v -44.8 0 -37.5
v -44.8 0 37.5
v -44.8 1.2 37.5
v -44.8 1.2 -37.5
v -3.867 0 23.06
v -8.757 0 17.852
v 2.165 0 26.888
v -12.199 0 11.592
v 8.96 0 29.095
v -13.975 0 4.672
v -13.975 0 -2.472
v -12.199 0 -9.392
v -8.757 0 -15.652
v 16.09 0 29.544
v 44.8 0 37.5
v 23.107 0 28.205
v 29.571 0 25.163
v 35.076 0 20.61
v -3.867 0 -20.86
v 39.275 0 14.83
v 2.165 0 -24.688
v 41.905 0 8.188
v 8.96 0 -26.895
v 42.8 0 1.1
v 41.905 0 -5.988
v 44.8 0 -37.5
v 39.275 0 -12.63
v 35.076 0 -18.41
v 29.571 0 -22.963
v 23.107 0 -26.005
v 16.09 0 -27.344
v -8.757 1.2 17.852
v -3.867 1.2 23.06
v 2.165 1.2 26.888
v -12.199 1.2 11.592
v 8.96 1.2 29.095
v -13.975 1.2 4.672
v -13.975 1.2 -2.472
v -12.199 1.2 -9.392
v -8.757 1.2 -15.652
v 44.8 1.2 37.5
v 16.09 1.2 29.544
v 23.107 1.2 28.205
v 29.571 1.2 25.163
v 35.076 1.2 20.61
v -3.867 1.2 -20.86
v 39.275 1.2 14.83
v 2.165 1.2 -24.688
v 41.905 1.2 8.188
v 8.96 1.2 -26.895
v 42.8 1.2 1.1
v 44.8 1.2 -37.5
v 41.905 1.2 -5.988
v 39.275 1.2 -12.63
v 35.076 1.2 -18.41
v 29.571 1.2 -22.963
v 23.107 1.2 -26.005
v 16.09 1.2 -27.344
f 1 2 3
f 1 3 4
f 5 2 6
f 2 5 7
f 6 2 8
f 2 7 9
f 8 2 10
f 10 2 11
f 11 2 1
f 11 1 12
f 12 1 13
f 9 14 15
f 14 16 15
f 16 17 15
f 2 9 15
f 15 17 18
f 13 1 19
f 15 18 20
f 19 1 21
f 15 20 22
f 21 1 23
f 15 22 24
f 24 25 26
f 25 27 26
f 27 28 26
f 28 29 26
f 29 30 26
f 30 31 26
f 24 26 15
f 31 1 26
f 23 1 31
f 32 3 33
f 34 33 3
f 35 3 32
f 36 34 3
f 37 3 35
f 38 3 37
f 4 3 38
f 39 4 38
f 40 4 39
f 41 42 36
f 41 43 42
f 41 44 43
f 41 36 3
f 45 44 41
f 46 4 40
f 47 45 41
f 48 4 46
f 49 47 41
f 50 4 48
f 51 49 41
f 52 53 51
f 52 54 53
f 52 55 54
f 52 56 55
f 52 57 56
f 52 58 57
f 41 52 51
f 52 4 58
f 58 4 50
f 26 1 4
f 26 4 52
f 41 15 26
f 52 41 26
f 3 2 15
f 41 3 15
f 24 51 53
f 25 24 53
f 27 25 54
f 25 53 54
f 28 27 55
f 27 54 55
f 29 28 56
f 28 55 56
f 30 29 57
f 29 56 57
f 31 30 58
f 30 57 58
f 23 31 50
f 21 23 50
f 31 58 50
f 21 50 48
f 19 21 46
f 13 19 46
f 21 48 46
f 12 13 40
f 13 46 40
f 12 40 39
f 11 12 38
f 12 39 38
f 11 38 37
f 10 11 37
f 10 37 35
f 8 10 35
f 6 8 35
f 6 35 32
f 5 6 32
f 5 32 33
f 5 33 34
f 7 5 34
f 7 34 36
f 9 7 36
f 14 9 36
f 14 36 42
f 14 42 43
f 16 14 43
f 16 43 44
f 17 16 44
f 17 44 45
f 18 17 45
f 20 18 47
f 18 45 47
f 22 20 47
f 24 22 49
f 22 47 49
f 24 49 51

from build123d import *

# Parameters (mm, degrees)
SKETCH1_W               = 89.6
SKETCH1_H               = 75
BOSS_EXTRUDE1_DEPTH     = 1.2
SKETCH2_R               = 28.5
CUT_EXTRUDE1_DEPTH      = 1
CUT_EXTRUDE1_DEPTH_BACK = 2.2


with BuildPart() as part:
    # Sketch1 → Boss-Extrude1 (new body)
    with BuildSketch(Plane(origin=(0, 0, 0), x_dir=(1, 0, 0), z_dir=(0, 1, 0))):
        Rectangle(SKETCH1_W, SKETCH1_H)
    extrude(amount=BOSS_EXTRUDE1_DEPTH)

    # Sketch2 → Cut-Extrude1 (cut, two sides)
    with BuildSketch(Plane(origin=(0, 1.2, 0), x_dir=(1, 0, 0), z_dir=(0, 1, 0))) as cut_extrude1_sk:
        with Locations((14.3, -1.1)):
            Circle(SKETCH2_R)
    extrude(amount=CUT_EXTRUDE1_DEPTH, mode=Mode.SUBTRACT)
    extrude(cut_extrude1_sk.sketch, amount=-CUT_EXTRUDE1_DEPTH_BACK, mode=Mode.SUBTRACT)


solid = part.part
